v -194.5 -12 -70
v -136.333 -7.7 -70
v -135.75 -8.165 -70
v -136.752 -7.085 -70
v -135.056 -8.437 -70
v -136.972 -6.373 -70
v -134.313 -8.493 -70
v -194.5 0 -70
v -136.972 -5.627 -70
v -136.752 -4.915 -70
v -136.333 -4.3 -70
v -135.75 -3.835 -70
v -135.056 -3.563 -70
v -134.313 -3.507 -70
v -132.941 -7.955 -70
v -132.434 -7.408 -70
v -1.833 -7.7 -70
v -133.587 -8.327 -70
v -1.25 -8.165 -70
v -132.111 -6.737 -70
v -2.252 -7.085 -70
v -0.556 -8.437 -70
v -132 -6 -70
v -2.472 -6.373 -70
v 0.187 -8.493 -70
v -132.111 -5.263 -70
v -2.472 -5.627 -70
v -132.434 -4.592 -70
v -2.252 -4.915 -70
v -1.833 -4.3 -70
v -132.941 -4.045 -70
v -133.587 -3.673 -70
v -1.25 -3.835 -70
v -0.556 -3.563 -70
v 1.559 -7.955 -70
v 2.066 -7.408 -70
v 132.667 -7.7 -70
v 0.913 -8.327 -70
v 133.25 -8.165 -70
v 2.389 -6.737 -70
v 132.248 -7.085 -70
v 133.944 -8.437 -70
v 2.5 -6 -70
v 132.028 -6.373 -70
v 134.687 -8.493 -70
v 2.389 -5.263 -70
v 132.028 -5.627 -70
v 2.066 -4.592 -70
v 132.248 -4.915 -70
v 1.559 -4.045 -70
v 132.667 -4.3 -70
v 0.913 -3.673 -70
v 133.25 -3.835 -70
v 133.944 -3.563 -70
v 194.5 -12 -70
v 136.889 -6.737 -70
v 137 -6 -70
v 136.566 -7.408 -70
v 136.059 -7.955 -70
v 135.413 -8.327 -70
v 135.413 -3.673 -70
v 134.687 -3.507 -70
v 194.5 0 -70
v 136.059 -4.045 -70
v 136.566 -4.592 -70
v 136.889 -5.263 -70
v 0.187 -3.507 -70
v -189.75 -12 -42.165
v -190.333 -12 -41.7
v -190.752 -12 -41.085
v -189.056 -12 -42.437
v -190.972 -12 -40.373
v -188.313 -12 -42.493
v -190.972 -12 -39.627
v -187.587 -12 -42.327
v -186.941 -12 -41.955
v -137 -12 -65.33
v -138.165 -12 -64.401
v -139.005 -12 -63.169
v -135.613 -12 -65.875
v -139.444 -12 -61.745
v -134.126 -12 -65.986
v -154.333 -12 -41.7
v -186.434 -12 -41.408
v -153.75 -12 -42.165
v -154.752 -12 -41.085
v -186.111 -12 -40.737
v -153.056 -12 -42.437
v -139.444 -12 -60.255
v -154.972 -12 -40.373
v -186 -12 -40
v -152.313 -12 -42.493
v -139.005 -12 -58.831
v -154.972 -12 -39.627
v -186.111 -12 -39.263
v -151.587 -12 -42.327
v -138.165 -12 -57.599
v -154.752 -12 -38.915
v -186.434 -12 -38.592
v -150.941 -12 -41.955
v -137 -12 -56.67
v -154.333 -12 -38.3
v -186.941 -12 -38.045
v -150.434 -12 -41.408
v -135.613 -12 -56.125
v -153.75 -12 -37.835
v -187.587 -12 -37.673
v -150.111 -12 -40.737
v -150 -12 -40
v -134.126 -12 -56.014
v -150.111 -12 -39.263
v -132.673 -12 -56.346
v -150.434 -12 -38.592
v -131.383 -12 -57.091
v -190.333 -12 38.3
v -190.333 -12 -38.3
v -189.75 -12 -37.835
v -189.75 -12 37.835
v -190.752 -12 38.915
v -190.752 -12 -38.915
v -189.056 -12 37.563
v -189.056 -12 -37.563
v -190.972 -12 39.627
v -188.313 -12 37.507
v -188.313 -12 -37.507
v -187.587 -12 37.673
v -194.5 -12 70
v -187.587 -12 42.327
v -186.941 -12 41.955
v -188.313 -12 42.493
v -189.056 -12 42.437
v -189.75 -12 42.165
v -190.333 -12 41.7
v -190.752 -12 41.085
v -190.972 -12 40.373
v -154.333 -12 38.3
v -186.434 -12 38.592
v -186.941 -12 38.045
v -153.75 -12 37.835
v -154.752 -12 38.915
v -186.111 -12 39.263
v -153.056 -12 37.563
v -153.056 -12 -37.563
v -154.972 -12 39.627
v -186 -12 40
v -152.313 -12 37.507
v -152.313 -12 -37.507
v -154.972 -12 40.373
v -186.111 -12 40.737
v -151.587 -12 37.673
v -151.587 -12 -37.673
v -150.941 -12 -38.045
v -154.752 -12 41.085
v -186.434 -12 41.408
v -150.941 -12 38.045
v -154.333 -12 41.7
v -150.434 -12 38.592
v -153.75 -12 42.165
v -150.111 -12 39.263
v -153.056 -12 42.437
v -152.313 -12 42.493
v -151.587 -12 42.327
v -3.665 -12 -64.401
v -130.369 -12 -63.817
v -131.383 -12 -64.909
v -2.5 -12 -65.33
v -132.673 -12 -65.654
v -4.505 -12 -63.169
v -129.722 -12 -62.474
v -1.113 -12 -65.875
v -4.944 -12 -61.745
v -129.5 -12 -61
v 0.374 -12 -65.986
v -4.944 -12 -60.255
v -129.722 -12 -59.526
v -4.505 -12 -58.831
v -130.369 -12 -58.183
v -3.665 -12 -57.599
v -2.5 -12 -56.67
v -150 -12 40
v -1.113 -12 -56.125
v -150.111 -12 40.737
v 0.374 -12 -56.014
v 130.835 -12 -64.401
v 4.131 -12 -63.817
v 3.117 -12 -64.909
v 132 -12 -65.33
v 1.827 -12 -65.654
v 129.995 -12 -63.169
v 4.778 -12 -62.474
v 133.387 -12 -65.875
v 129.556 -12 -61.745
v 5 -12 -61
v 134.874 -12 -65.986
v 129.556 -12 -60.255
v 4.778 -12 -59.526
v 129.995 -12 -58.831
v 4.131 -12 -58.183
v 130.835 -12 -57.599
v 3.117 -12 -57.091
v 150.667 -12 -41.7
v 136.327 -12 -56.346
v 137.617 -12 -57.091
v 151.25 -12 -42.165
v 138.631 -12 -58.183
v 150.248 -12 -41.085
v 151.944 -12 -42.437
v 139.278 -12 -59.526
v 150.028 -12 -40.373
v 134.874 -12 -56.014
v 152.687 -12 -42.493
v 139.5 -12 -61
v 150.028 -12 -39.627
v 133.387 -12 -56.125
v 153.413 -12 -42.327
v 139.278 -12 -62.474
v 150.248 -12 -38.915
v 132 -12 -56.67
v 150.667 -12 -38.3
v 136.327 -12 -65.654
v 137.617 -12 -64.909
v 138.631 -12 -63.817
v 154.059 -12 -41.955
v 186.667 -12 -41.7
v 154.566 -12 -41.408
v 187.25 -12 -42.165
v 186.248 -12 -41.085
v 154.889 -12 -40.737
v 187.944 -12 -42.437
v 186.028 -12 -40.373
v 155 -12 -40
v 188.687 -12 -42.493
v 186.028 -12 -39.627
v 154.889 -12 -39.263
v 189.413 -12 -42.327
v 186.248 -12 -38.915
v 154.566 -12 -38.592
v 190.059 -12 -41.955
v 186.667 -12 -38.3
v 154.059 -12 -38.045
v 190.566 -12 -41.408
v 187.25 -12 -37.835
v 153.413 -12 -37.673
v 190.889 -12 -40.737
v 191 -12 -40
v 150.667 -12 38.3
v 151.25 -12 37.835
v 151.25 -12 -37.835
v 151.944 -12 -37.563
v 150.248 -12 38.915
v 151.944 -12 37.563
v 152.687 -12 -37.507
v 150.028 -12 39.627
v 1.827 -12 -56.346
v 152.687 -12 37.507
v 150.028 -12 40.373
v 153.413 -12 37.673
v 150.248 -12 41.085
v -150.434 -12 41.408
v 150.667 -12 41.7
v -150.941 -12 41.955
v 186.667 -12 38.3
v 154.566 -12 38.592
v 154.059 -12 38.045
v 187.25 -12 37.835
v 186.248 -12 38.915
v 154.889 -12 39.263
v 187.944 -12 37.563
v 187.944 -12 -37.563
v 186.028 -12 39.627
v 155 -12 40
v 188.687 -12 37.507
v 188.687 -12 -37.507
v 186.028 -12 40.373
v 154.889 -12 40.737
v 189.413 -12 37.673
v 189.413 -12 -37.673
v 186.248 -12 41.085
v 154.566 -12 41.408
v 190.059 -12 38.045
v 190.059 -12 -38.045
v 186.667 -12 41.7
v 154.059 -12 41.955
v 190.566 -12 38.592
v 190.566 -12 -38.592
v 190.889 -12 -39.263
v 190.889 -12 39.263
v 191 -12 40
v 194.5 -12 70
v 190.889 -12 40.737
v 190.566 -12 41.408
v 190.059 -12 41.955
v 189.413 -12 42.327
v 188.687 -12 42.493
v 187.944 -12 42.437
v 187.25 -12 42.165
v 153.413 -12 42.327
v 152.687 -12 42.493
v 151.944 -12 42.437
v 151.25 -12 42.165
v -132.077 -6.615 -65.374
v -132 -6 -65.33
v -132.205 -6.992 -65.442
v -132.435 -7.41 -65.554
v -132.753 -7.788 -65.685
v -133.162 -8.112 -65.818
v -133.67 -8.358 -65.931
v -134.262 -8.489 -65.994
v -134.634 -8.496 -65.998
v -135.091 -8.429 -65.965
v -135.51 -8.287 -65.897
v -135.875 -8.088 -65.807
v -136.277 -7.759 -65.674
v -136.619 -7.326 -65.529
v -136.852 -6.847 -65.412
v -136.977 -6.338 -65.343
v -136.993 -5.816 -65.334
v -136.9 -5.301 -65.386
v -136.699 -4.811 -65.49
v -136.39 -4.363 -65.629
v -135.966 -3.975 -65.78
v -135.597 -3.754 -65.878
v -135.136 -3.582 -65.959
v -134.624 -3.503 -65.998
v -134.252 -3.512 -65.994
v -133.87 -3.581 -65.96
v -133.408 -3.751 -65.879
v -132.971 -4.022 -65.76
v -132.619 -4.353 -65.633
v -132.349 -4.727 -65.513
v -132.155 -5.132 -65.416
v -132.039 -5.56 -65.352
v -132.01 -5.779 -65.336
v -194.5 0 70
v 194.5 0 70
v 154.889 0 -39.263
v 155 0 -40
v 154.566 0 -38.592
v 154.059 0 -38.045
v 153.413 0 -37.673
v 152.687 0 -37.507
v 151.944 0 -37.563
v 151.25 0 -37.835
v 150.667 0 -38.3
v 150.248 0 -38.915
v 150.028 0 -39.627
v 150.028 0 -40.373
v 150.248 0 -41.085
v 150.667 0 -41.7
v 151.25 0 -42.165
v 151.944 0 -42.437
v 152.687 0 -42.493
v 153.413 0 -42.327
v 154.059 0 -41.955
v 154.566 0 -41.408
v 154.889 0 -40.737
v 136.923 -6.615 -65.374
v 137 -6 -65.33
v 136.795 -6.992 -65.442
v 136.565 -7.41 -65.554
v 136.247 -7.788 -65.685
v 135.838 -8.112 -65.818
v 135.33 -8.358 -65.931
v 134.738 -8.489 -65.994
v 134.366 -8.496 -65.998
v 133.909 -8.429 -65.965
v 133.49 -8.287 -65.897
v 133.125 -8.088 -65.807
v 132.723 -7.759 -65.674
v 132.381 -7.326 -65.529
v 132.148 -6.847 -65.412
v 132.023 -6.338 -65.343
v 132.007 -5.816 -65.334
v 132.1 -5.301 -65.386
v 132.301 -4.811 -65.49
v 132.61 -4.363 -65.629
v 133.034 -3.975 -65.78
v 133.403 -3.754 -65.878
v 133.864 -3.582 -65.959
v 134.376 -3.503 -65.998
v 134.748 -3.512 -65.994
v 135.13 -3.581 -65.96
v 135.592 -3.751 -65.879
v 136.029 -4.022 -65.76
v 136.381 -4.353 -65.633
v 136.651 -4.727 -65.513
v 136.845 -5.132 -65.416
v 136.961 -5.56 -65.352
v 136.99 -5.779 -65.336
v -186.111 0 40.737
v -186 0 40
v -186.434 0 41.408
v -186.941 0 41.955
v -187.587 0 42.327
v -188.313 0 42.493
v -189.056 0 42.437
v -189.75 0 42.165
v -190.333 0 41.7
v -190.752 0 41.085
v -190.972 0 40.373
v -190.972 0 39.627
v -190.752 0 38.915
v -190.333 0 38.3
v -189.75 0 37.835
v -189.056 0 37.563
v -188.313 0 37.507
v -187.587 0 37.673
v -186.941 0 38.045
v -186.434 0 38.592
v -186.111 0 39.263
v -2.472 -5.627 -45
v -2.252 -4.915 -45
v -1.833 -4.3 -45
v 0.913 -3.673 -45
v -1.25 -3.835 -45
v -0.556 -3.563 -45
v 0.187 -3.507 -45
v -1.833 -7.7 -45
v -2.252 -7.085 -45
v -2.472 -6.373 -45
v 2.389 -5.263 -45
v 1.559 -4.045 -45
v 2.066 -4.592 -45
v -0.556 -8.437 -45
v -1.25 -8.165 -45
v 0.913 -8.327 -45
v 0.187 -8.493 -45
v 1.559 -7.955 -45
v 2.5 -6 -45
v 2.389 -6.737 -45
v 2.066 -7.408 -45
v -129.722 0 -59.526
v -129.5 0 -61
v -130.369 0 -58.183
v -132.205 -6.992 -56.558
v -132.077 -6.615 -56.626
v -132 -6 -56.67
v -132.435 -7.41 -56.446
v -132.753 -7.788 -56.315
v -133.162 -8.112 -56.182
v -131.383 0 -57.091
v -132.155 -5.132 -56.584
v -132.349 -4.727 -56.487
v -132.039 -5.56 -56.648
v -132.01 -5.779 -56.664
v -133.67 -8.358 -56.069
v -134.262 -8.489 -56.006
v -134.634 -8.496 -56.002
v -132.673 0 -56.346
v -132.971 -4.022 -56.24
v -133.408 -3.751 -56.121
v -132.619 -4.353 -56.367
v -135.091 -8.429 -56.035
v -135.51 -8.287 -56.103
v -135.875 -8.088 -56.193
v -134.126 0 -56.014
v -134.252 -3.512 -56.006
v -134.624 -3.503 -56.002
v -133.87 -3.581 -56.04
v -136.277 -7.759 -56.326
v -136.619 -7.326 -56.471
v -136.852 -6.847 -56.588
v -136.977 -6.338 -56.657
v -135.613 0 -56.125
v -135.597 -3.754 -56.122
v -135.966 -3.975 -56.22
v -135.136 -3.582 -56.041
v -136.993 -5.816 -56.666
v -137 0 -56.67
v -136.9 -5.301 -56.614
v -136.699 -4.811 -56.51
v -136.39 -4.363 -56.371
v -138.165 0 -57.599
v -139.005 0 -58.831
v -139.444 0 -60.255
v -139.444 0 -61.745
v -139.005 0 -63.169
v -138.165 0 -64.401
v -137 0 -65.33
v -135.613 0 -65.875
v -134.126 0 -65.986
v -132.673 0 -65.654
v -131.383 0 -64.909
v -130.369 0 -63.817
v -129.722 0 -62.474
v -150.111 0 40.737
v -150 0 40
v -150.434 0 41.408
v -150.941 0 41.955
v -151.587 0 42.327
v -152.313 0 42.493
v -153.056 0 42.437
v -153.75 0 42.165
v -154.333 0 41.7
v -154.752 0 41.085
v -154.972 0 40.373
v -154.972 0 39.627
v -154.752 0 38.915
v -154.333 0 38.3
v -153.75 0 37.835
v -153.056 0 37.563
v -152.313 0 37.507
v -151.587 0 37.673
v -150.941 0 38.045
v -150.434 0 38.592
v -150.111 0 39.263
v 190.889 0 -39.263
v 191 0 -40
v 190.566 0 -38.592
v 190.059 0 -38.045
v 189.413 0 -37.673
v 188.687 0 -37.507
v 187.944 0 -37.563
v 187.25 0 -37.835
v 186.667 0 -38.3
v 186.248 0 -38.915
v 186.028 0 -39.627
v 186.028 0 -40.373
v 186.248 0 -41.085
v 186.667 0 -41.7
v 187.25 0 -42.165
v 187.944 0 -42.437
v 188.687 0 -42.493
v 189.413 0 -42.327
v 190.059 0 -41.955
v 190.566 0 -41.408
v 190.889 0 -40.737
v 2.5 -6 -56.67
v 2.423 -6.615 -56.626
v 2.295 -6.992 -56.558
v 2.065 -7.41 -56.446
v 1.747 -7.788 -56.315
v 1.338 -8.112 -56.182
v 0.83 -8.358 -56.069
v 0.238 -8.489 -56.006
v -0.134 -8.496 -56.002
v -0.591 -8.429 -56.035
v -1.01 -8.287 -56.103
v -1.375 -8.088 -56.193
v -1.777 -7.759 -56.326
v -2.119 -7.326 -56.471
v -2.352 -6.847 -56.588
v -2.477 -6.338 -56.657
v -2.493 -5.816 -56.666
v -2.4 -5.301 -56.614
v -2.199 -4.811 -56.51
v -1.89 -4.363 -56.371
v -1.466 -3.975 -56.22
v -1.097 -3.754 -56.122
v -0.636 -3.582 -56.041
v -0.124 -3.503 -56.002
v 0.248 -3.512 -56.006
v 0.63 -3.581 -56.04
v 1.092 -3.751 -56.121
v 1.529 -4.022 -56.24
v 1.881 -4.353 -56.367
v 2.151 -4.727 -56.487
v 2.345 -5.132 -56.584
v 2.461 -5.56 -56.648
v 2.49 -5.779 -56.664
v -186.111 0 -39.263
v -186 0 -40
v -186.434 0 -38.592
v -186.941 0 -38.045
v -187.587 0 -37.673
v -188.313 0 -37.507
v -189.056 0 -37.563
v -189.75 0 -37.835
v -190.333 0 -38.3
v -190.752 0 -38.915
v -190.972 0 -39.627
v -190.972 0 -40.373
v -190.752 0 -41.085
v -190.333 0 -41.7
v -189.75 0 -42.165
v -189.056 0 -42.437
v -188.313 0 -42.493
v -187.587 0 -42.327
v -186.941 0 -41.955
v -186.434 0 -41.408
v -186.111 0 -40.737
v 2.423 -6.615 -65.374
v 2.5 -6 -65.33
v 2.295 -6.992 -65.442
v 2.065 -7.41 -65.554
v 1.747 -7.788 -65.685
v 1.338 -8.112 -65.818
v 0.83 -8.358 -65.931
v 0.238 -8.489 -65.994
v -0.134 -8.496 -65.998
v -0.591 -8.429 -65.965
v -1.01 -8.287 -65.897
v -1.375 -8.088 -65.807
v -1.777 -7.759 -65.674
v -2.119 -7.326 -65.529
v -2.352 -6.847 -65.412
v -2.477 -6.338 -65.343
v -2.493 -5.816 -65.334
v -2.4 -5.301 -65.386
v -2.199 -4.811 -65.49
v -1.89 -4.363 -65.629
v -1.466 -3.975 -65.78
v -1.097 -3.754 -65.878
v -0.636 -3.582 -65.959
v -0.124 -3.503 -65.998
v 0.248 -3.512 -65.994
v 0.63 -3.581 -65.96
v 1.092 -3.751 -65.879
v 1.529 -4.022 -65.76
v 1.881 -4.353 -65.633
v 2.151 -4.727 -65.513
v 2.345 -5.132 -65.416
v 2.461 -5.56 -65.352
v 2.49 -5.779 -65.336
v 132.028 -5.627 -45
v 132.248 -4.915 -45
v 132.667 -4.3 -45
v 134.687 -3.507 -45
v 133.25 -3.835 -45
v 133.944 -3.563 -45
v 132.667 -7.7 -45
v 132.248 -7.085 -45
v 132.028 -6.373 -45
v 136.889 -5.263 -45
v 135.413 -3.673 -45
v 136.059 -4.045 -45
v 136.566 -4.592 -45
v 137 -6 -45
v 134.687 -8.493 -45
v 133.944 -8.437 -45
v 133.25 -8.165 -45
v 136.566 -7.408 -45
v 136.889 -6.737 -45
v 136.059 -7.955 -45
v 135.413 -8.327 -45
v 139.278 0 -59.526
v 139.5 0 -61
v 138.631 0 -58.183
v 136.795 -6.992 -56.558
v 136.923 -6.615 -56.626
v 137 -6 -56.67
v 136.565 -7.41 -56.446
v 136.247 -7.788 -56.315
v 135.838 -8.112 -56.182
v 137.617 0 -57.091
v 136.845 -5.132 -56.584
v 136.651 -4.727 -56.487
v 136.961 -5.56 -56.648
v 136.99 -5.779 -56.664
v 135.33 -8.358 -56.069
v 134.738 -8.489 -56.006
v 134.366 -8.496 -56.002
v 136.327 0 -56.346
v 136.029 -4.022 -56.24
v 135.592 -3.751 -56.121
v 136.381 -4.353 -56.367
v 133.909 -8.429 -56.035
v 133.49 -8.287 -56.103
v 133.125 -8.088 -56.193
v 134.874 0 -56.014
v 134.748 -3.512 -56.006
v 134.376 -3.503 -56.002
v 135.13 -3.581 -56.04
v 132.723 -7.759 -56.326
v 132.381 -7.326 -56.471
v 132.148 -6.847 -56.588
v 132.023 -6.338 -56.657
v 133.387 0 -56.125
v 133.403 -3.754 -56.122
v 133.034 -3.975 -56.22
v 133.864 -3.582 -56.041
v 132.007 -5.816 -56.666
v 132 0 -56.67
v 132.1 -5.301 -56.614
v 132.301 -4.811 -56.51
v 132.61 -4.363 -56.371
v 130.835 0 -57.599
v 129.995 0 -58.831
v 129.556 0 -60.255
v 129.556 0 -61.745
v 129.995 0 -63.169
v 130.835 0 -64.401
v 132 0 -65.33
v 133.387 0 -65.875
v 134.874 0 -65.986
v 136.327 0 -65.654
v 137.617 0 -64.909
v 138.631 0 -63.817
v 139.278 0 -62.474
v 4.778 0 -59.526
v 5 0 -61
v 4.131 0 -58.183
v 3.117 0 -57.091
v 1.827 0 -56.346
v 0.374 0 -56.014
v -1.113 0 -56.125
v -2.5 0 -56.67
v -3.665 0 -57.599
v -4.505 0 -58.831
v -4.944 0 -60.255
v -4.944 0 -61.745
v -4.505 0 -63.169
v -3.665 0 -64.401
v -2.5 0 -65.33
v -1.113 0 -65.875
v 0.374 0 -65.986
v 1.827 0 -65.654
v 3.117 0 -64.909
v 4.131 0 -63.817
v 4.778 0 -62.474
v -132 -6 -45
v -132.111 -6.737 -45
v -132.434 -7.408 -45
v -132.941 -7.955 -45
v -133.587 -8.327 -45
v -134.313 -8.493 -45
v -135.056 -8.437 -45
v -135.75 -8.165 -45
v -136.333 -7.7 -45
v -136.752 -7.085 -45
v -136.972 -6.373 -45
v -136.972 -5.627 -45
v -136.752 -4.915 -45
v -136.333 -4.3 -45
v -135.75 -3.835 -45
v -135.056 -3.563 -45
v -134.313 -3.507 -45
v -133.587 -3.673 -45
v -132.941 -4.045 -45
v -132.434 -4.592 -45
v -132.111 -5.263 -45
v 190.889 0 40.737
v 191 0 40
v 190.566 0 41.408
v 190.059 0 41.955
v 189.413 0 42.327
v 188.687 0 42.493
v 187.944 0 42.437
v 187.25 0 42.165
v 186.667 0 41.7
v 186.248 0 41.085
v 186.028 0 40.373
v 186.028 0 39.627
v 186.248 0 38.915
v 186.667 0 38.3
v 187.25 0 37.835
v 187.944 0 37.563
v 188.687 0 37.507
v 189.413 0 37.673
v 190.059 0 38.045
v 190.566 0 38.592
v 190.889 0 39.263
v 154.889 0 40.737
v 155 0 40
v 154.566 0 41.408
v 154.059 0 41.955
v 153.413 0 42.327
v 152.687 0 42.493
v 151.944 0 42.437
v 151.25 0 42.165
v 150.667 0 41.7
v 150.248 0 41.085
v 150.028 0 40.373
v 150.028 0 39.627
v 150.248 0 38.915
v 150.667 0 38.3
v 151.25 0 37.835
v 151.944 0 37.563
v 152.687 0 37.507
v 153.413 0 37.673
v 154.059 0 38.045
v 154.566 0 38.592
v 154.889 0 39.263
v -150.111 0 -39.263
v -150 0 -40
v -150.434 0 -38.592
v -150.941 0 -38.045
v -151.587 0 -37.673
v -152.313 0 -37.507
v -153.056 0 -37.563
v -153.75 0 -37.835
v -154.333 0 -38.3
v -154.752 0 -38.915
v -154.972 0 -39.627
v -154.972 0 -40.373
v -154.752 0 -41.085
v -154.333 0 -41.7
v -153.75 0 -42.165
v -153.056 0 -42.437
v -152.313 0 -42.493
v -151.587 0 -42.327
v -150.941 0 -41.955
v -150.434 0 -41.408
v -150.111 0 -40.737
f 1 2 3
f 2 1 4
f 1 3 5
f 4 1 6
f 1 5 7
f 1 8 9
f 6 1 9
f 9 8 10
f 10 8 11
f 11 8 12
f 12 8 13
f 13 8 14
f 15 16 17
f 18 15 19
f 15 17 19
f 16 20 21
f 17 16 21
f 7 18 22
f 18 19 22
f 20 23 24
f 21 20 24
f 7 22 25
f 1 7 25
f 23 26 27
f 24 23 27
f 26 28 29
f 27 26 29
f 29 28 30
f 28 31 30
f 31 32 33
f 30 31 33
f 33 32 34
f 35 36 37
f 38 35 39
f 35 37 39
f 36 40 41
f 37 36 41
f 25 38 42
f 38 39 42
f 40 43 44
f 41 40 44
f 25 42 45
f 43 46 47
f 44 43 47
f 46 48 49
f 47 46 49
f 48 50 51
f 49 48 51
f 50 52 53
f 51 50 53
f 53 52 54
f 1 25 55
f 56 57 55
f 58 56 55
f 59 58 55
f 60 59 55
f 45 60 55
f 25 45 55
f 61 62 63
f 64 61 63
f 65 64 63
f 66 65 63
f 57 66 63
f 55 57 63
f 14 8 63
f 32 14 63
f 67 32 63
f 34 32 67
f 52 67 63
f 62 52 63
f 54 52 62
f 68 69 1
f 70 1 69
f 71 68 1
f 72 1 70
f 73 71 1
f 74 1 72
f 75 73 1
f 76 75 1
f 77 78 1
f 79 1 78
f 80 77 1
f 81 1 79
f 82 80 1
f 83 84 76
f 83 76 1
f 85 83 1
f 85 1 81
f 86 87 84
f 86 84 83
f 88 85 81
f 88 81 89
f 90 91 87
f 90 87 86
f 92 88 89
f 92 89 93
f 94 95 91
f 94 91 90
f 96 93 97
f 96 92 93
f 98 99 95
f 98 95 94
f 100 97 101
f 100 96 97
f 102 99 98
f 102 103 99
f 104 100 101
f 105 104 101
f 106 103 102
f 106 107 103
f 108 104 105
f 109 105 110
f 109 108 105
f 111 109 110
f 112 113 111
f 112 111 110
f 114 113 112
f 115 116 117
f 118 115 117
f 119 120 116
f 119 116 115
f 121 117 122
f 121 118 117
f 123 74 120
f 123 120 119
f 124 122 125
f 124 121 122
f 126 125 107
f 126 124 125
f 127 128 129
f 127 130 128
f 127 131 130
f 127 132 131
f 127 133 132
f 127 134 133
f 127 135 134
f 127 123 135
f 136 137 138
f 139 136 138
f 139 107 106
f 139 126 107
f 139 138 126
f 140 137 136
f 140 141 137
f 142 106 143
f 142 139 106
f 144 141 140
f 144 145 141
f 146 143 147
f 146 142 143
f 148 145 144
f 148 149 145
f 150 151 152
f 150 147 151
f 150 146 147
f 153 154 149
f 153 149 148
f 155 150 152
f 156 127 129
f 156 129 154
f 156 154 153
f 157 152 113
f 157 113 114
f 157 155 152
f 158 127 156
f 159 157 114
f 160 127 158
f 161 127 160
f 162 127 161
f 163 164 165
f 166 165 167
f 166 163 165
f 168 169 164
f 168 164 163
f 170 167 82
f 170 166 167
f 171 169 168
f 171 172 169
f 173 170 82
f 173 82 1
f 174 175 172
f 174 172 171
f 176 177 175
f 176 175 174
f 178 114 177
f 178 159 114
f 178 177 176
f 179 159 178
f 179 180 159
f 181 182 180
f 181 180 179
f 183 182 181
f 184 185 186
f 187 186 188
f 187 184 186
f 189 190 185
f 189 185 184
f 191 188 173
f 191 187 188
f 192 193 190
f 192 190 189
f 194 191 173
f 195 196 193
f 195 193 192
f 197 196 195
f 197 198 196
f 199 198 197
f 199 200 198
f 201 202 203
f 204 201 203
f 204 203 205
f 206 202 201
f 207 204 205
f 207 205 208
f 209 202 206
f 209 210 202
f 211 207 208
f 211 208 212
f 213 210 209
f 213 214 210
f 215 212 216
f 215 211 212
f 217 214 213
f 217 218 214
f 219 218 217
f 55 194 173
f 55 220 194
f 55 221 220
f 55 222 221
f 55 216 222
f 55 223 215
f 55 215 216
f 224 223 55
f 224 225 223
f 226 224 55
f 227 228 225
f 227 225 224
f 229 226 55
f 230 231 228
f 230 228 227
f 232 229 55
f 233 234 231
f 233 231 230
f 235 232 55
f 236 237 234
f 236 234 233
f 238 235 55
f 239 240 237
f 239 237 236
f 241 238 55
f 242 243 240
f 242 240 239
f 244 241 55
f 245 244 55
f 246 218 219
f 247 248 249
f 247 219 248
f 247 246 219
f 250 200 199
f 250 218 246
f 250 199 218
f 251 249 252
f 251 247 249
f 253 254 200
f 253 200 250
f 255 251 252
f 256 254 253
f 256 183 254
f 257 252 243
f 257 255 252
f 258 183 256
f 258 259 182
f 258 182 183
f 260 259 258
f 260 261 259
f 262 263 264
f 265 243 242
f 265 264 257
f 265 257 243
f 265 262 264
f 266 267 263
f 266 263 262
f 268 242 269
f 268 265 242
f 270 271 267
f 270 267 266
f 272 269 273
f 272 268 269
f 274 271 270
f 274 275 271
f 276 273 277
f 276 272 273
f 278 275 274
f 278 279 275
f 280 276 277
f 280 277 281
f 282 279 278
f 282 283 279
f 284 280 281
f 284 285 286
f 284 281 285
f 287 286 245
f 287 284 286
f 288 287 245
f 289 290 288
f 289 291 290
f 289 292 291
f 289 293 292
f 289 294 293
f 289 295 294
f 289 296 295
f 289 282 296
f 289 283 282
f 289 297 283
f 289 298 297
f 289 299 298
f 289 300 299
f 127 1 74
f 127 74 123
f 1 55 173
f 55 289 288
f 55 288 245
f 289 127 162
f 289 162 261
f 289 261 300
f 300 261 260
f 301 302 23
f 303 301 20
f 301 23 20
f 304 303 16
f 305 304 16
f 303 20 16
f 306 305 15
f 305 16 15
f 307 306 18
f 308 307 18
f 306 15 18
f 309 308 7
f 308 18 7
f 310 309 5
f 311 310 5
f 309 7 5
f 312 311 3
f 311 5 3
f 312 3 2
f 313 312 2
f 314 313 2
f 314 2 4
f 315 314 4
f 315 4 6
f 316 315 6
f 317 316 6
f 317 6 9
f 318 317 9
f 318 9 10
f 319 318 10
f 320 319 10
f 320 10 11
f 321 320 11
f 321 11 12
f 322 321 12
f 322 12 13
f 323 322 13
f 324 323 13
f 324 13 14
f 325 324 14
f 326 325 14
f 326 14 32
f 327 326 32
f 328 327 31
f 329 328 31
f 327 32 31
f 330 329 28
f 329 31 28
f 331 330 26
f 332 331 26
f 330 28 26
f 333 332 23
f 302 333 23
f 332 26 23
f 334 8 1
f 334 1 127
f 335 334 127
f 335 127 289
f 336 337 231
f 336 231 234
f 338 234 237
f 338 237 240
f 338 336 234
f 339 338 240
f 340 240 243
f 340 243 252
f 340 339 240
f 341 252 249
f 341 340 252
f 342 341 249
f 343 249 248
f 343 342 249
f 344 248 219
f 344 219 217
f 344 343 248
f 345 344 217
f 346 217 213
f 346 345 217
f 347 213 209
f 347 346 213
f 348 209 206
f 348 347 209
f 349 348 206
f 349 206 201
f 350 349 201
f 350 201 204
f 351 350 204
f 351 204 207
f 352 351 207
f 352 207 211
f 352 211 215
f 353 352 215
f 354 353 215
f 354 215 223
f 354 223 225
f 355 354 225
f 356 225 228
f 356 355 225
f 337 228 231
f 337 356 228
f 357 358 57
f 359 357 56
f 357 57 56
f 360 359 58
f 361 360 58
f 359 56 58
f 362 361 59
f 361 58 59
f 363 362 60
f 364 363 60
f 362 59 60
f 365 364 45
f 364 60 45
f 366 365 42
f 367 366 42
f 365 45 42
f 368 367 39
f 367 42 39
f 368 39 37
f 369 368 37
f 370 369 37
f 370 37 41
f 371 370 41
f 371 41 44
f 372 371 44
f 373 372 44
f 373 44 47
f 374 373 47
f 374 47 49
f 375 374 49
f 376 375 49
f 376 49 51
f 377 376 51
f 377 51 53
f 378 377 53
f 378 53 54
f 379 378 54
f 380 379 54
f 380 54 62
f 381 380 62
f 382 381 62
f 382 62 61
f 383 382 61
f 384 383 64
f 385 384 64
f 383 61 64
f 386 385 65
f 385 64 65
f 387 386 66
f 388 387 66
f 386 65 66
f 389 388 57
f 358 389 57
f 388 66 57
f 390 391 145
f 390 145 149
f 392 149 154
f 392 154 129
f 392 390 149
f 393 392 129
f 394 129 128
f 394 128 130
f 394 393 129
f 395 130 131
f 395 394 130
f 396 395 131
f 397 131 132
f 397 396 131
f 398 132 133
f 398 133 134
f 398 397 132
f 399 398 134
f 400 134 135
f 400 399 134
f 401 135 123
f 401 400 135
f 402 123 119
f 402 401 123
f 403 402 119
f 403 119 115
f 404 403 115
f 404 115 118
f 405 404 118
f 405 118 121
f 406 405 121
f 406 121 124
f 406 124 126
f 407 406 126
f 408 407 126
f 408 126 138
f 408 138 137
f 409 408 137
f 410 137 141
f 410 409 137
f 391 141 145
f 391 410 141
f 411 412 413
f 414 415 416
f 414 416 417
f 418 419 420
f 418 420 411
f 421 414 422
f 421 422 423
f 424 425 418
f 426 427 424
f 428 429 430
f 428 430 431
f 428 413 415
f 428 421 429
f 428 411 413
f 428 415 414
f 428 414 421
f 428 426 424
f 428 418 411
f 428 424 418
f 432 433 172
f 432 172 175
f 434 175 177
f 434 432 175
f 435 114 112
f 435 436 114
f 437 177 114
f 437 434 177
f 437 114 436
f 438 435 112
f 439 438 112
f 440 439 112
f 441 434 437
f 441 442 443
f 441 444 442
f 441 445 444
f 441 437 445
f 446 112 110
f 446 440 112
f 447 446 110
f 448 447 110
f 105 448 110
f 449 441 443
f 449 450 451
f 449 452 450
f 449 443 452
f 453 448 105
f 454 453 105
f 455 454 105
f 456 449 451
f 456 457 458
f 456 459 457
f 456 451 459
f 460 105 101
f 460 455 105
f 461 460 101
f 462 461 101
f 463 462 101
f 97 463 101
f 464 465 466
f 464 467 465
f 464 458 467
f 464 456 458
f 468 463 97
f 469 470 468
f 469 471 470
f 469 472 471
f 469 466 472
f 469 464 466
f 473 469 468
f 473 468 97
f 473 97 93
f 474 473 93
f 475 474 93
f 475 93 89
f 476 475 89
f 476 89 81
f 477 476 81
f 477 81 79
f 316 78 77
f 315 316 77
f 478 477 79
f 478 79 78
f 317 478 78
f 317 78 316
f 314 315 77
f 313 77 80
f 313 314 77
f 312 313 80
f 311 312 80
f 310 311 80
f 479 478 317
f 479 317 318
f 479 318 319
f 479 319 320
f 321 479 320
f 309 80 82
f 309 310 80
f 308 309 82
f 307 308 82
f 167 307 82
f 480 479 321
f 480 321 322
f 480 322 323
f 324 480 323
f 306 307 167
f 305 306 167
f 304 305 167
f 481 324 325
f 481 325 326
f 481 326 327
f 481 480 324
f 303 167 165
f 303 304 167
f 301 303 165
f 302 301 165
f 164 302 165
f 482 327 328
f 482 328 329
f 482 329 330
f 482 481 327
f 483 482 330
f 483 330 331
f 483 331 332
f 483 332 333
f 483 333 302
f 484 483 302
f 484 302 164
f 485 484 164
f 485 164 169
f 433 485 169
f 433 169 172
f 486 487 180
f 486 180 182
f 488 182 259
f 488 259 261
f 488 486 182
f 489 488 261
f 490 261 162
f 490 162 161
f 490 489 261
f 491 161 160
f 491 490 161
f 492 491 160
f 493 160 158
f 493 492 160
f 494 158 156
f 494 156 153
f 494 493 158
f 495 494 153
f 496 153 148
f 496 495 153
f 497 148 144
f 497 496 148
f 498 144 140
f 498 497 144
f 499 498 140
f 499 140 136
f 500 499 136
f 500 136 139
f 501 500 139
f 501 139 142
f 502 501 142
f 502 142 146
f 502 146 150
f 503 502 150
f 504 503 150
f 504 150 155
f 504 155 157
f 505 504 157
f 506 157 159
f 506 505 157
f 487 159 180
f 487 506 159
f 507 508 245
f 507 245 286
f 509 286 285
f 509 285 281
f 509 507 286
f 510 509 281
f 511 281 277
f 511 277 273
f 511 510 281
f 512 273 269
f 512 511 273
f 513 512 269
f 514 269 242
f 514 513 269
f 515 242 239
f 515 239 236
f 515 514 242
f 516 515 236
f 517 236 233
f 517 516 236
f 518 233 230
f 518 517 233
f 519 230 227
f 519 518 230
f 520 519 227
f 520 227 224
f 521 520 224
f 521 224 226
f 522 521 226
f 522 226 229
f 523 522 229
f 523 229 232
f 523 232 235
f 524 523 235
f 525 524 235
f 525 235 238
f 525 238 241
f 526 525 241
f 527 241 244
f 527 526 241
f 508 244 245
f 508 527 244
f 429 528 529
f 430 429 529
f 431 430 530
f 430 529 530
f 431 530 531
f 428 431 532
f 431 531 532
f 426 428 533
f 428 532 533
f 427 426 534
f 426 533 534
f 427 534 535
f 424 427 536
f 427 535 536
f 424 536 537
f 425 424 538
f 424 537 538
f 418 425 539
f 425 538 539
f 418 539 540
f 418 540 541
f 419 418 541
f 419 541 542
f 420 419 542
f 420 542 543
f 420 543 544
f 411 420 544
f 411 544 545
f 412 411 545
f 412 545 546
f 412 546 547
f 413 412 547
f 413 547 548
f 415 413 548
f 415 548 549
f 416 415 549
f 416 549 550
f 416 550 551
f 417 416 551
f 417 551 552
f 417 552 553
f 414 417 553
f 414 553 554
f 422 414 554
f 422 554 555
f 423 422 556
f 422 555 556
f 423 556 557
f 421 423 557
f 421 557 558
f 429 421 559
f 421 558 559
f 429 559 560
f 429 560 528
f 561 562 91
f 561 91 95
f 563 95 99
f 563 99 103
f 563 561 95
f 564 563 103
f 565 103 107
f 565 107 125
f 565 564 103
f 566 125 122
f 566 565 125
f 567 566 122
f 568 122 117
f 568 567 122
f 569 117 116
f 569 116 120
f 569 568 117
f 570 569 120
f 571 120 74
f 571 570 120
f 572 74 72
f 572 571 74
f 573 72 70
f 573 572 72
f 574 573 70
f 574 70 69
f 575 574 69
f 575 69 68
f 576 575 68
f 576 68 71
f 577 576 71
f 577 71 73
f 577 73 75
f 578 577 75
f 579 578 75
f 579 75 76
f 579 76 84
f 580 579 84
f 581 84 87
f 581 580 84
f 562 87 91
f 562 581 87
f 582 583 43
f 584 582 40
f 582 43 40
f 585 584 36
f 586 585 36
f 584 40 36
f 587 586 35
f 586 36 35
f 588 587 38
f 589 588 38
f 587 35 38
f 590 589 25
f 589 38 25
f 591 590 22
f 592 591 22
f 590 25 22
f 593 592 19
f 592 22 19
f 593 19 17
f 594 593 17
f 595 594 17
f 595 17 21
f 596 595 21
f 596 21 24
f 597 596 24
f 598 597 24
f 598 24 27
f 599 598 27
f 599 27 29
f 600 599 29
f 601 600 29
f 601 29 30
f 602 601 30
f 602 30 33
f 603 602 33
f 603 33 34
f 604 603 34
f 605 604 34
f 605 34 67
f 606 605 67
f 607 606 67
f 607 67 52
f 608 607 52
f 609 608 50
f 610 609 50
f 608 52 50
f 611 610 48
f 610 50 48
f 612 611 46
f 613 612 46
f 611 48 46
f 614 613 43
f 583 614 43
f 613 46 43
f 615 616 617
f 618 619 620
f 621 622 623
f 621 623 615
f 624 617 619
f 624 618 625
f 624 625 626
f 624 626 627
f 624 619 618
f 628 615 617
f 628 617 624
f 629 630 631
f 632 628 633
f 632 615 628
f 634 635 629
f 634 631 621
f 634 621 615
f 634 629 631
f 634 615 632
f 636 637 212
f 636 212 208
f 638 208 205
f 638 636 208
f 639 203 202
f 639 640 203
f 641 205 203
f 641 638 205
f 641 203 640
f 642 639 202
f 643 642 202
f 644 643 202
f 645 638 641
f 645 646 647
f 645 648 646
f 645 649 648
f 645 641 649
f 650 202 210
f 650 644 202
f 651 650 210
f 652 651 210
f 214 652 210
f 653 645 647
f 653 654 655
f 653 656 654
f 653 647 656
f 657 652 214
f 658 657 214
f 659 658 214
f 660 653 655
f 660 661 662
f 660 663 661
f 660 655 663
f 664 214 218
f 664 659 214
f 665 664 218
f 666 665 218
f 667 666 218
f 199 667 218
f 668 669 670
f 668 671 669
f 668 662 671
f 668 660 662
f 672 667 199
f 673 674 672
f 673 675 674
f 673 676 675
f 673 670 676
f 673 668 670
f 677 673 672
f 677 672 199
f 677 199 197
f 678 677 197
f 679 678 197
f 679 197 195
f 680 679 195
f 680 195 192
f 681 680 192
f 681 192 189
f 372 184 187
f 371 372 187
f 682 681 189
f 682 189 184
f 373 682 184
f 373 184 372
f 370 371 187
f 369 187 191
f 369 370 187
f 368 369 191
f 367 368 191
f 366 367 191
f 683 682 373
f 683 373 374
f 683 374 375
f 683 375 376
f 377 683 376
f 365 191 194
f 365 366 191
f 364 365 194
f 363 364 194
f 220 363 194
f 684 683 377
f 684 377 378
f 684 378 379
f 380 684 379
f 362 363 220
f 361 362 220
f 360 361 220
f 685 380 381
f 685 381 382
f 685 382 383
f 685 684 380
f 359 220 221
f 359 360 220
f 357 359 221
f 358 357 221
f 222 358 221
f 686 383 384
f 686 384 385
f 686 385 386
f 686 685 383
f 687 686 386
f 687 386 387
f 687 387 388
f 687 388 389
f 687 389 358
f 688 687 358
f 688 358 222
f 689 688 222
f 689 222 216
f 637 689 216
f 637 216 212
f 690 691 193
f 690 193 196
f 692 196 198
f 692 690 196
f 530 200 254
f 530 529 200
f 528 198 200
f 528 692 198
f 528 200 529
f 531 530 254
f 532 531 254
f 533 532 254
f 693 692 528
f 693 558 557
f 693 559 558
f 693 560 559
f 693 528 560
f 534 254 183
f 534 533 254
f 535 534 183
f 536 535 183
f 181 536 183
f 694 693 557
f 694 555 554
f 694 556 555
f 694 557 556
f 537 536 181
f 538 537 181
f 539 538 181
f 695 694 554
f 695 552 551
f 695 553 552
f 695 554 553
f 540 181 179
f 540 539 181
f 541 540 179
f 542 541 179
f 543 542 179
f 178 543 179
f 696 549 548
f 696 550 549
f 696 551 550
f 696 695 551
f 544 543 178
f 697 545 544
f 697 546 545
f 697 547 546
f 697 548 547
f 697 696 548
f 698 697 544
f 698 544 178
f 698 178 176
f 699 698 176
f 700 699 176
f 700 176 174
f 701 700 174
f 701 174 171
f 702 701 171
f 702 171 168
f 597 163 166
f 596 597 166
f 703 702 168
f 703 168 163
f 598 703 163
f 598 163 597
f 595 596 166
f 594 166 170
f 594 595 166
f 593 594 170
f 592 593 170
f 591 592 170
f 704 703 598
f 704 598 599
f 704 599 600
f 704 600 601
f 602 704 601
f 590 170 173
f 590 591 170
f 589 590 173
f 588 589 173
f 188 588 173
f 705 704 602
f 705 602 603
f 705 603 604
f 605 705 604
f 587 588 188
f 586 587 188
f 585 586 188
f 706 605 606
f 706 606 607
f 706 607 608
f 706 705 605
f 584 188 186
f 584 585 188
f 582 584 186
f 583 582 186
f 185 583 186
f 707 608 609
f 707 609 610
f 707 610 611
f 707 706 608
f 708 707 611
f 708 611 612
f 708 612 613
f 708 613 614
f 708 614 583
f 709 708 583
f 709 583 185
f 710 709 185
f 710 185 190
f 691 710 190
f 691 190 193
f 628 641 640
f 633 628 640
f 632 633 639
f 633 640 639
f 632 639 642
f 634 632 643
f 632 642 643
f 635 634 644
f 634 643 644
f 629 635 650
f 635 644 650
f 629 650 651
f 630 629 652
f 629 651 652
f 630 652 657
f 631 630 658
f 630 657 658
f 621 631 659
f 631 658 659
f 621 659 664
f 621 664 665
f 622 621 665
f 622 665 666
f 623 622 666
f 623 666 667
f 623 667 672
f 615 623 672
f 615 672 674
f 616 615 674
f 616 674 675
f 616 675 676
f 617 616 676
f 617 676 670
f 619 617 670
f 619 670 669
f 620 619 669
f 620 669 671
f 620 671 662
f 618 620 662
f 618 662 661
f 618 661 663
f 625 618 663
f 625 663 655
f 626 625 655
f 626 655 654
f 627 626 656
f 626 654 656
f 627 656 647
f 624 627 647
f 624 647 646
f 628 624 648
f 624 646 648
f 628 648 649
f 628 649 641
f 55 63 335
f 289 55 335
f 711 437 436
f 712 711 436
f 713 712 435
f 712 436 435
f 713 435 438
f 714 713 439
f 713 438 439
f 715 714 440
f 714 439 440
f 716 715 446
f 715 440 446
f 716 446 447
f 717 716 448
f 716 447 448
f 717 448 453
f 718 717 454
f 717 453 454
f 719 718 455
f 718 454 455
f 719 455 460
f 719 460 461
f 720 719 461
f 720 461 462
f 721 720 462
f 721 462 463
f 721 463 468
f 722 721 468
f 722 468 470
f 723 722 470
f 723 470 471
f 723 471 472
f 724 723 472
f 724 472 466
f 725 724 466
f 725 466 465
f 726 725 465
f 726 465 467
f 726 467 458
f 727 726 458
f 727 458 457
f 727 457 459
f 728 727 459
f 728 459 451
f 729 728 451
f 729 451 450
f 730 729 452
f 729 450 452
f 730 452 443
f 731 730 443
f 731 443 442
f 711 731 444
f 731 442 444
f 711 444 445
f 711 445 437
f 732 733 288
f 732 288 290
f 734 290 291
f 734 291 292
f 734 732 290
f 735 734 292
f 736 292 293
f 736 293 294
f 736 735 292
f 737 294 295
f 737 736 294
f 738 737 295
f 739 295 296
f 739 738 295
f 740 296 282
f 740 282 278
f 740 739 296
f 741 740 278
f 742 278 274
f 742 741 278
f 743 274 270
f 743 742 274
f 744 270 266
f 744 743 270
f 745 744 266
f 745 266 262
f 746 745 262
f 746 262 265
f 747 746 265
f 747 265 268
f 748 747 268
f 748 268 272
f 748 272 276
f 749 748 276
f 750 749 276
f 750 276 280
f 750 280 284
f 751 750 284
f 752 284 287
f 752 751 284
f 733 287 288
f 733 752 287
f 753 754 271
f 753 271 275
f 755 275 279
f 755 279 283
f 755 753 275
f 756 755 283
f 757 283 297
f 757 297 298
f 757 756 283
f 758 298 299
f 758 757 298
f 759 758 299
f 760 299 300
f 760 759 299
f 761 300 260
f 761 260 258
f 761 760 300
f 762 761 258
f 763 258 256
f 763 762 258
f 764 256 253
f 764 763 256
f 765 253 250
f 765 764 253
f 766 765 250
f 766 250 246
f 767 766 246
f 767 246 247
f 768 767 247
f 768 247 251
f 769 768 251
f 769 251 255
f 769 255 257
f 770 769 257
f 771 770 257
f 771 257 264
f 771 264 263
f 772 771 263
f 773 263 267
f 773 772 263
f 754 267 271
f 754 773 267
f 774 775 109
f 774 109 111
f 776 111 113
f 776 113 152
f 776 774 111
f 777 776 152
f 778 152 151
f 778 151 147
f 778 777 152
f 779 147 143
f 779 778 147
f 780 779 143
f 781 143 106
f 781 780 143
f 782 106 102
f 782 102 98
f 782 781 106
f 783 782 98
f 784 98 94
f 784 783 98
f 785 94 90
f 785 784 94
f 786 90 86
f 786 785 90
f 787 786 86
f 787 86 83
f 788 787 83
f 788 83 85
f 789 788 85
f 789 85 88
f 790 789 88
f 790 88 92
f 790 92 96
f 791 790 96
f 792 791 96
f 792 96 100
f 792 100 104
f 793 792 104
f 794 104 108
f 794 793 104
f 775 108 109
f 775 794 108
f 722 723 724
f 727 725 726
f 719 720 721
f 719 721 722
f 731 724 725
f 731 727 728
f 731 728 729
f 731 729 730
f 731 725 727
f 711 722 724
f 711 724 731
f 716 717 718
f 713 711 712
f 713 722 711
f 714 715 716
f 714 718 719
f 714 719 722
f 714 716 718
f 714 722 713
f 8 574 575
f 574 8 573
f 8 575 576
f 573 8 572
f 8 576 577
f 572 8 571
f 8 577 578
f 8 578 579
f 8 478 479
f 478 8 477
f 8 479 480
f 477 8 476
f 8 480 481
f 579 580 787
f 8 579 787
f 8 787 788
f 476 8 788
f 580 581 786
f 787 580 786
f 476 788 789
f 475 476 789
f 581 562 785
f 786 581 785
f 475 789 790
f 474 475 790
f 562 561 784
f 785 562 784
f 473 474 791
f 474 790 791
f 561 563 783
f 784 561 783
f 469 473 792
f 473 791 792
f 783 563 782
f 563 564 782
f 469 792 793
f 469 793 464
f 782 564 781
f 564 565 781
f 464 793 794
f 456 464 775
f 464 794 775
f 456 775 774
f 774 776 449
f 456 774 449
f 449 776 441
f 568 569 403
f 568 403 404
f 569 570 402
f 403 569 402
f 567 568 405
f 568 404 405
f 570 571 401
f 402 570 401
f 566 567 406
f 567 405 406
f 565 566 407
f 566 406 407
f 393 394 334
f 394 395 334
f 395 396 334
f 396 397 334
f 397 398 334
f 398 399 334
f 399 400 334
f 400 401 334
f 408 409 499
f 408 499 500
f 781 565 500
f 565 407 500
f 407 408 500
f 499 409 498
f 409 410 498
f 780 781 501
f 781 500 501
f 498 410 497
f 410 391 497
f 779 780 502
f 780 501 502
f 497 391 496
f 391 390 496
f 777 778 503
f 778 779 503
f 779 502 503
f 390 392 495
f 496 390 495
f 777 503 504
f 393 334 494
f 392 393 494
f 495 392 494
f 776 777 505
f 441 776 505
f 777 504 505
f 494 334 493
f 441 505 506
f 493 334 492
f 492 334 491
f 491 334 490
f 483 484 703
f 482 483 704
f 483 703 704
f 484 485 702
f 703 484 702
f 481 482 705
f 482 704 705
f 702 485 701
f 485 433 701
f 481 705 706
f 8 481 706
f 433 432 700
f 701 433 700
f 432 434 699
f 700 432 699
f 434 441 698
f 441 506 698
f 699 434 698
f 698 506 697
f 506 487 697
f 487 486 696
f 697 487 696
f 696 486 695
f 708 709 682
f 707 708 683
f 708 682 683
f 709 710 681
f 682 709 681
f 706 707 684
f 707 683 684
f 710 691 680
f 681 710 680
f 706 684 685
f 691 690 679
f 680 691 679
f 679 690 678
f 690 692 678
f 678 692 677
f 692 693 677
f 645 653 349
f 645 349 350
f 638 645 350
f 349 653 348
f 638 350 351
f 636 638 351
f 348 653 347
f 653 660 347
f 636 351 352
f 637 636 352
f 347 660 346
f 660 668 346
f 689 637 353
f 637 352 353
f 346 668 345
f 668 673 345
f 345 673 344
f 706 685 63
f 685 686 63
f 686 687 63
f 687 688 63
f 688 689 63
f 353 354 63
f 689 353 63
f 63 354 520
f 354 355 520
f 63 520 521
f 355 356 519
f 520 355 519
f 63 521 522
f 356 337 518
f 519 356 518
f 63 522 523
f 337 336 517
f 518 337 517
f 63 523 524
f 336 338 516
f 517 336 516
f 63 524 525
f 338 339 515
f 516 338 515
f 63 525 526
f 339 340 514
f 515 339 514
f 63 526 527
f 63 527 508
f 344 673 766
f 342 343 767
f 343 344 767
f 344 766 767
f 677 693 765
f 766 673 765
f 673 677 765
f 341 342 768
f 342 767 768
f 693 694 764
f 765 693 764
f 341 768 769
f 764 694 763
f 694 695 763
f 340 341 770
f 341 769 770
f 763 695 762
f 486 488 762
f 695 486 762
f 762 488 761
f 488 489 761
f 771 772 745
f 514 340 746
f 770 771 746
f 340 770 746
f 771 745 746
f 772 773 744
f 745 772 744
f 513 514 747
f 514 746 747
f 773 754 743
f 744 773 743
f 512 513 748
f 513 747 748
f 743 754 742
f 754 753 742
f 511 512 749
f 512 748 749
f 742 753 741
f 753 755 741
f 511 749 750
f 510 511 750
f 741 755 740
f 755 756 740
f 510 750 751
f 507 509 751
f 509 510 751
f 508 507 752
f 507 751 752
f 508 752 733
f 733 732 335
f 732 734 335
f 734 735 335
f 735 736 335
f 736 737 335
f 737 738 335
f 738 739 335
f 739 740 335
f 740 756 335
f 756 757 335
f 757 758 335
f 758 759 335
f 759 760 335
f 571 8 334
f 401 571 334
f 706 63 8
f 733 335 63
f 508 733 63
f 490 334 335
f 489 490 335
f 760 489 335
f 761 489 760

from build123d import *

# Parameters (mm, degrees)
F0_W     = 389
F0_H     = 140
F0_R     = 5
F0_R_2   = 2.5
F1_DEPTH = 12
F2_R     = 2.5
F3_DEPTH = 25


with BuildPart() as f1:
    # F0 (on Front) → F1 (new body)
    with BuildSketch(Plane.XZ):
        Rectangle(F0_W, F0_H)
        with Locations((-134.5, -61)):
            Circle(F0_R, mode=Mode.SUBTRACT)
        with Locations((-188.5, -40)):
            Circle(F0_R_2, mode=Mode.SUBTRACT)
        with Locations((-152.5, -40)):
            Circle(F0_R_2, mode=Mode.SUBTRACT)
        with Locations((0, -61)):
            Circle(F0_R, mode=Mode.SUBTRACT)
        with Locations((134.5, -61)):
            Circle(F0_R, mode=Mode.SUBTRACT)
        with Locations((152.5, -40)):
            Circle(F0_R_2, mode=Mode.SUBTRACT)
        with Locations((188.5, -40)):
            Circle(F0_R_2, mode=Mode.SUBTRACT)
        with Locations((-188.5, 40)):
            Circle(F0_R_2, mode=Mode.SUBTRACT)
        with Locations((-152.5, 40)):
            Circle(F0_R_2, mode=Mode.SUBTRACT)
        with Locations((152.5, 40)):
            Circle(F0_R_2, mode=Mode.SUBTRACT)
        with Locations((188.5, 40)):
            Circle(F0_R_2, mode=Mode.SUBTRACT)
    extrude(amount=F1_DEPTH)

    # F2 (on face) → F3 (cut)
    with BuildSketch(Plane(origin=(0, 0, -70), x_dir=(1, 0, 0), z_dir=(0, 0, -1))):
        with Locations((0, 6)):
            Circle(F2_R)
        with Locations((134.5, 6)):
            Circle(F2_R)
        with Locations((-134.5, 6)):
            Circle(F2_R)
    extrude(amount=-F3_DEPTH, mode=Mode.SUBTRACT)


solid = f1.part
